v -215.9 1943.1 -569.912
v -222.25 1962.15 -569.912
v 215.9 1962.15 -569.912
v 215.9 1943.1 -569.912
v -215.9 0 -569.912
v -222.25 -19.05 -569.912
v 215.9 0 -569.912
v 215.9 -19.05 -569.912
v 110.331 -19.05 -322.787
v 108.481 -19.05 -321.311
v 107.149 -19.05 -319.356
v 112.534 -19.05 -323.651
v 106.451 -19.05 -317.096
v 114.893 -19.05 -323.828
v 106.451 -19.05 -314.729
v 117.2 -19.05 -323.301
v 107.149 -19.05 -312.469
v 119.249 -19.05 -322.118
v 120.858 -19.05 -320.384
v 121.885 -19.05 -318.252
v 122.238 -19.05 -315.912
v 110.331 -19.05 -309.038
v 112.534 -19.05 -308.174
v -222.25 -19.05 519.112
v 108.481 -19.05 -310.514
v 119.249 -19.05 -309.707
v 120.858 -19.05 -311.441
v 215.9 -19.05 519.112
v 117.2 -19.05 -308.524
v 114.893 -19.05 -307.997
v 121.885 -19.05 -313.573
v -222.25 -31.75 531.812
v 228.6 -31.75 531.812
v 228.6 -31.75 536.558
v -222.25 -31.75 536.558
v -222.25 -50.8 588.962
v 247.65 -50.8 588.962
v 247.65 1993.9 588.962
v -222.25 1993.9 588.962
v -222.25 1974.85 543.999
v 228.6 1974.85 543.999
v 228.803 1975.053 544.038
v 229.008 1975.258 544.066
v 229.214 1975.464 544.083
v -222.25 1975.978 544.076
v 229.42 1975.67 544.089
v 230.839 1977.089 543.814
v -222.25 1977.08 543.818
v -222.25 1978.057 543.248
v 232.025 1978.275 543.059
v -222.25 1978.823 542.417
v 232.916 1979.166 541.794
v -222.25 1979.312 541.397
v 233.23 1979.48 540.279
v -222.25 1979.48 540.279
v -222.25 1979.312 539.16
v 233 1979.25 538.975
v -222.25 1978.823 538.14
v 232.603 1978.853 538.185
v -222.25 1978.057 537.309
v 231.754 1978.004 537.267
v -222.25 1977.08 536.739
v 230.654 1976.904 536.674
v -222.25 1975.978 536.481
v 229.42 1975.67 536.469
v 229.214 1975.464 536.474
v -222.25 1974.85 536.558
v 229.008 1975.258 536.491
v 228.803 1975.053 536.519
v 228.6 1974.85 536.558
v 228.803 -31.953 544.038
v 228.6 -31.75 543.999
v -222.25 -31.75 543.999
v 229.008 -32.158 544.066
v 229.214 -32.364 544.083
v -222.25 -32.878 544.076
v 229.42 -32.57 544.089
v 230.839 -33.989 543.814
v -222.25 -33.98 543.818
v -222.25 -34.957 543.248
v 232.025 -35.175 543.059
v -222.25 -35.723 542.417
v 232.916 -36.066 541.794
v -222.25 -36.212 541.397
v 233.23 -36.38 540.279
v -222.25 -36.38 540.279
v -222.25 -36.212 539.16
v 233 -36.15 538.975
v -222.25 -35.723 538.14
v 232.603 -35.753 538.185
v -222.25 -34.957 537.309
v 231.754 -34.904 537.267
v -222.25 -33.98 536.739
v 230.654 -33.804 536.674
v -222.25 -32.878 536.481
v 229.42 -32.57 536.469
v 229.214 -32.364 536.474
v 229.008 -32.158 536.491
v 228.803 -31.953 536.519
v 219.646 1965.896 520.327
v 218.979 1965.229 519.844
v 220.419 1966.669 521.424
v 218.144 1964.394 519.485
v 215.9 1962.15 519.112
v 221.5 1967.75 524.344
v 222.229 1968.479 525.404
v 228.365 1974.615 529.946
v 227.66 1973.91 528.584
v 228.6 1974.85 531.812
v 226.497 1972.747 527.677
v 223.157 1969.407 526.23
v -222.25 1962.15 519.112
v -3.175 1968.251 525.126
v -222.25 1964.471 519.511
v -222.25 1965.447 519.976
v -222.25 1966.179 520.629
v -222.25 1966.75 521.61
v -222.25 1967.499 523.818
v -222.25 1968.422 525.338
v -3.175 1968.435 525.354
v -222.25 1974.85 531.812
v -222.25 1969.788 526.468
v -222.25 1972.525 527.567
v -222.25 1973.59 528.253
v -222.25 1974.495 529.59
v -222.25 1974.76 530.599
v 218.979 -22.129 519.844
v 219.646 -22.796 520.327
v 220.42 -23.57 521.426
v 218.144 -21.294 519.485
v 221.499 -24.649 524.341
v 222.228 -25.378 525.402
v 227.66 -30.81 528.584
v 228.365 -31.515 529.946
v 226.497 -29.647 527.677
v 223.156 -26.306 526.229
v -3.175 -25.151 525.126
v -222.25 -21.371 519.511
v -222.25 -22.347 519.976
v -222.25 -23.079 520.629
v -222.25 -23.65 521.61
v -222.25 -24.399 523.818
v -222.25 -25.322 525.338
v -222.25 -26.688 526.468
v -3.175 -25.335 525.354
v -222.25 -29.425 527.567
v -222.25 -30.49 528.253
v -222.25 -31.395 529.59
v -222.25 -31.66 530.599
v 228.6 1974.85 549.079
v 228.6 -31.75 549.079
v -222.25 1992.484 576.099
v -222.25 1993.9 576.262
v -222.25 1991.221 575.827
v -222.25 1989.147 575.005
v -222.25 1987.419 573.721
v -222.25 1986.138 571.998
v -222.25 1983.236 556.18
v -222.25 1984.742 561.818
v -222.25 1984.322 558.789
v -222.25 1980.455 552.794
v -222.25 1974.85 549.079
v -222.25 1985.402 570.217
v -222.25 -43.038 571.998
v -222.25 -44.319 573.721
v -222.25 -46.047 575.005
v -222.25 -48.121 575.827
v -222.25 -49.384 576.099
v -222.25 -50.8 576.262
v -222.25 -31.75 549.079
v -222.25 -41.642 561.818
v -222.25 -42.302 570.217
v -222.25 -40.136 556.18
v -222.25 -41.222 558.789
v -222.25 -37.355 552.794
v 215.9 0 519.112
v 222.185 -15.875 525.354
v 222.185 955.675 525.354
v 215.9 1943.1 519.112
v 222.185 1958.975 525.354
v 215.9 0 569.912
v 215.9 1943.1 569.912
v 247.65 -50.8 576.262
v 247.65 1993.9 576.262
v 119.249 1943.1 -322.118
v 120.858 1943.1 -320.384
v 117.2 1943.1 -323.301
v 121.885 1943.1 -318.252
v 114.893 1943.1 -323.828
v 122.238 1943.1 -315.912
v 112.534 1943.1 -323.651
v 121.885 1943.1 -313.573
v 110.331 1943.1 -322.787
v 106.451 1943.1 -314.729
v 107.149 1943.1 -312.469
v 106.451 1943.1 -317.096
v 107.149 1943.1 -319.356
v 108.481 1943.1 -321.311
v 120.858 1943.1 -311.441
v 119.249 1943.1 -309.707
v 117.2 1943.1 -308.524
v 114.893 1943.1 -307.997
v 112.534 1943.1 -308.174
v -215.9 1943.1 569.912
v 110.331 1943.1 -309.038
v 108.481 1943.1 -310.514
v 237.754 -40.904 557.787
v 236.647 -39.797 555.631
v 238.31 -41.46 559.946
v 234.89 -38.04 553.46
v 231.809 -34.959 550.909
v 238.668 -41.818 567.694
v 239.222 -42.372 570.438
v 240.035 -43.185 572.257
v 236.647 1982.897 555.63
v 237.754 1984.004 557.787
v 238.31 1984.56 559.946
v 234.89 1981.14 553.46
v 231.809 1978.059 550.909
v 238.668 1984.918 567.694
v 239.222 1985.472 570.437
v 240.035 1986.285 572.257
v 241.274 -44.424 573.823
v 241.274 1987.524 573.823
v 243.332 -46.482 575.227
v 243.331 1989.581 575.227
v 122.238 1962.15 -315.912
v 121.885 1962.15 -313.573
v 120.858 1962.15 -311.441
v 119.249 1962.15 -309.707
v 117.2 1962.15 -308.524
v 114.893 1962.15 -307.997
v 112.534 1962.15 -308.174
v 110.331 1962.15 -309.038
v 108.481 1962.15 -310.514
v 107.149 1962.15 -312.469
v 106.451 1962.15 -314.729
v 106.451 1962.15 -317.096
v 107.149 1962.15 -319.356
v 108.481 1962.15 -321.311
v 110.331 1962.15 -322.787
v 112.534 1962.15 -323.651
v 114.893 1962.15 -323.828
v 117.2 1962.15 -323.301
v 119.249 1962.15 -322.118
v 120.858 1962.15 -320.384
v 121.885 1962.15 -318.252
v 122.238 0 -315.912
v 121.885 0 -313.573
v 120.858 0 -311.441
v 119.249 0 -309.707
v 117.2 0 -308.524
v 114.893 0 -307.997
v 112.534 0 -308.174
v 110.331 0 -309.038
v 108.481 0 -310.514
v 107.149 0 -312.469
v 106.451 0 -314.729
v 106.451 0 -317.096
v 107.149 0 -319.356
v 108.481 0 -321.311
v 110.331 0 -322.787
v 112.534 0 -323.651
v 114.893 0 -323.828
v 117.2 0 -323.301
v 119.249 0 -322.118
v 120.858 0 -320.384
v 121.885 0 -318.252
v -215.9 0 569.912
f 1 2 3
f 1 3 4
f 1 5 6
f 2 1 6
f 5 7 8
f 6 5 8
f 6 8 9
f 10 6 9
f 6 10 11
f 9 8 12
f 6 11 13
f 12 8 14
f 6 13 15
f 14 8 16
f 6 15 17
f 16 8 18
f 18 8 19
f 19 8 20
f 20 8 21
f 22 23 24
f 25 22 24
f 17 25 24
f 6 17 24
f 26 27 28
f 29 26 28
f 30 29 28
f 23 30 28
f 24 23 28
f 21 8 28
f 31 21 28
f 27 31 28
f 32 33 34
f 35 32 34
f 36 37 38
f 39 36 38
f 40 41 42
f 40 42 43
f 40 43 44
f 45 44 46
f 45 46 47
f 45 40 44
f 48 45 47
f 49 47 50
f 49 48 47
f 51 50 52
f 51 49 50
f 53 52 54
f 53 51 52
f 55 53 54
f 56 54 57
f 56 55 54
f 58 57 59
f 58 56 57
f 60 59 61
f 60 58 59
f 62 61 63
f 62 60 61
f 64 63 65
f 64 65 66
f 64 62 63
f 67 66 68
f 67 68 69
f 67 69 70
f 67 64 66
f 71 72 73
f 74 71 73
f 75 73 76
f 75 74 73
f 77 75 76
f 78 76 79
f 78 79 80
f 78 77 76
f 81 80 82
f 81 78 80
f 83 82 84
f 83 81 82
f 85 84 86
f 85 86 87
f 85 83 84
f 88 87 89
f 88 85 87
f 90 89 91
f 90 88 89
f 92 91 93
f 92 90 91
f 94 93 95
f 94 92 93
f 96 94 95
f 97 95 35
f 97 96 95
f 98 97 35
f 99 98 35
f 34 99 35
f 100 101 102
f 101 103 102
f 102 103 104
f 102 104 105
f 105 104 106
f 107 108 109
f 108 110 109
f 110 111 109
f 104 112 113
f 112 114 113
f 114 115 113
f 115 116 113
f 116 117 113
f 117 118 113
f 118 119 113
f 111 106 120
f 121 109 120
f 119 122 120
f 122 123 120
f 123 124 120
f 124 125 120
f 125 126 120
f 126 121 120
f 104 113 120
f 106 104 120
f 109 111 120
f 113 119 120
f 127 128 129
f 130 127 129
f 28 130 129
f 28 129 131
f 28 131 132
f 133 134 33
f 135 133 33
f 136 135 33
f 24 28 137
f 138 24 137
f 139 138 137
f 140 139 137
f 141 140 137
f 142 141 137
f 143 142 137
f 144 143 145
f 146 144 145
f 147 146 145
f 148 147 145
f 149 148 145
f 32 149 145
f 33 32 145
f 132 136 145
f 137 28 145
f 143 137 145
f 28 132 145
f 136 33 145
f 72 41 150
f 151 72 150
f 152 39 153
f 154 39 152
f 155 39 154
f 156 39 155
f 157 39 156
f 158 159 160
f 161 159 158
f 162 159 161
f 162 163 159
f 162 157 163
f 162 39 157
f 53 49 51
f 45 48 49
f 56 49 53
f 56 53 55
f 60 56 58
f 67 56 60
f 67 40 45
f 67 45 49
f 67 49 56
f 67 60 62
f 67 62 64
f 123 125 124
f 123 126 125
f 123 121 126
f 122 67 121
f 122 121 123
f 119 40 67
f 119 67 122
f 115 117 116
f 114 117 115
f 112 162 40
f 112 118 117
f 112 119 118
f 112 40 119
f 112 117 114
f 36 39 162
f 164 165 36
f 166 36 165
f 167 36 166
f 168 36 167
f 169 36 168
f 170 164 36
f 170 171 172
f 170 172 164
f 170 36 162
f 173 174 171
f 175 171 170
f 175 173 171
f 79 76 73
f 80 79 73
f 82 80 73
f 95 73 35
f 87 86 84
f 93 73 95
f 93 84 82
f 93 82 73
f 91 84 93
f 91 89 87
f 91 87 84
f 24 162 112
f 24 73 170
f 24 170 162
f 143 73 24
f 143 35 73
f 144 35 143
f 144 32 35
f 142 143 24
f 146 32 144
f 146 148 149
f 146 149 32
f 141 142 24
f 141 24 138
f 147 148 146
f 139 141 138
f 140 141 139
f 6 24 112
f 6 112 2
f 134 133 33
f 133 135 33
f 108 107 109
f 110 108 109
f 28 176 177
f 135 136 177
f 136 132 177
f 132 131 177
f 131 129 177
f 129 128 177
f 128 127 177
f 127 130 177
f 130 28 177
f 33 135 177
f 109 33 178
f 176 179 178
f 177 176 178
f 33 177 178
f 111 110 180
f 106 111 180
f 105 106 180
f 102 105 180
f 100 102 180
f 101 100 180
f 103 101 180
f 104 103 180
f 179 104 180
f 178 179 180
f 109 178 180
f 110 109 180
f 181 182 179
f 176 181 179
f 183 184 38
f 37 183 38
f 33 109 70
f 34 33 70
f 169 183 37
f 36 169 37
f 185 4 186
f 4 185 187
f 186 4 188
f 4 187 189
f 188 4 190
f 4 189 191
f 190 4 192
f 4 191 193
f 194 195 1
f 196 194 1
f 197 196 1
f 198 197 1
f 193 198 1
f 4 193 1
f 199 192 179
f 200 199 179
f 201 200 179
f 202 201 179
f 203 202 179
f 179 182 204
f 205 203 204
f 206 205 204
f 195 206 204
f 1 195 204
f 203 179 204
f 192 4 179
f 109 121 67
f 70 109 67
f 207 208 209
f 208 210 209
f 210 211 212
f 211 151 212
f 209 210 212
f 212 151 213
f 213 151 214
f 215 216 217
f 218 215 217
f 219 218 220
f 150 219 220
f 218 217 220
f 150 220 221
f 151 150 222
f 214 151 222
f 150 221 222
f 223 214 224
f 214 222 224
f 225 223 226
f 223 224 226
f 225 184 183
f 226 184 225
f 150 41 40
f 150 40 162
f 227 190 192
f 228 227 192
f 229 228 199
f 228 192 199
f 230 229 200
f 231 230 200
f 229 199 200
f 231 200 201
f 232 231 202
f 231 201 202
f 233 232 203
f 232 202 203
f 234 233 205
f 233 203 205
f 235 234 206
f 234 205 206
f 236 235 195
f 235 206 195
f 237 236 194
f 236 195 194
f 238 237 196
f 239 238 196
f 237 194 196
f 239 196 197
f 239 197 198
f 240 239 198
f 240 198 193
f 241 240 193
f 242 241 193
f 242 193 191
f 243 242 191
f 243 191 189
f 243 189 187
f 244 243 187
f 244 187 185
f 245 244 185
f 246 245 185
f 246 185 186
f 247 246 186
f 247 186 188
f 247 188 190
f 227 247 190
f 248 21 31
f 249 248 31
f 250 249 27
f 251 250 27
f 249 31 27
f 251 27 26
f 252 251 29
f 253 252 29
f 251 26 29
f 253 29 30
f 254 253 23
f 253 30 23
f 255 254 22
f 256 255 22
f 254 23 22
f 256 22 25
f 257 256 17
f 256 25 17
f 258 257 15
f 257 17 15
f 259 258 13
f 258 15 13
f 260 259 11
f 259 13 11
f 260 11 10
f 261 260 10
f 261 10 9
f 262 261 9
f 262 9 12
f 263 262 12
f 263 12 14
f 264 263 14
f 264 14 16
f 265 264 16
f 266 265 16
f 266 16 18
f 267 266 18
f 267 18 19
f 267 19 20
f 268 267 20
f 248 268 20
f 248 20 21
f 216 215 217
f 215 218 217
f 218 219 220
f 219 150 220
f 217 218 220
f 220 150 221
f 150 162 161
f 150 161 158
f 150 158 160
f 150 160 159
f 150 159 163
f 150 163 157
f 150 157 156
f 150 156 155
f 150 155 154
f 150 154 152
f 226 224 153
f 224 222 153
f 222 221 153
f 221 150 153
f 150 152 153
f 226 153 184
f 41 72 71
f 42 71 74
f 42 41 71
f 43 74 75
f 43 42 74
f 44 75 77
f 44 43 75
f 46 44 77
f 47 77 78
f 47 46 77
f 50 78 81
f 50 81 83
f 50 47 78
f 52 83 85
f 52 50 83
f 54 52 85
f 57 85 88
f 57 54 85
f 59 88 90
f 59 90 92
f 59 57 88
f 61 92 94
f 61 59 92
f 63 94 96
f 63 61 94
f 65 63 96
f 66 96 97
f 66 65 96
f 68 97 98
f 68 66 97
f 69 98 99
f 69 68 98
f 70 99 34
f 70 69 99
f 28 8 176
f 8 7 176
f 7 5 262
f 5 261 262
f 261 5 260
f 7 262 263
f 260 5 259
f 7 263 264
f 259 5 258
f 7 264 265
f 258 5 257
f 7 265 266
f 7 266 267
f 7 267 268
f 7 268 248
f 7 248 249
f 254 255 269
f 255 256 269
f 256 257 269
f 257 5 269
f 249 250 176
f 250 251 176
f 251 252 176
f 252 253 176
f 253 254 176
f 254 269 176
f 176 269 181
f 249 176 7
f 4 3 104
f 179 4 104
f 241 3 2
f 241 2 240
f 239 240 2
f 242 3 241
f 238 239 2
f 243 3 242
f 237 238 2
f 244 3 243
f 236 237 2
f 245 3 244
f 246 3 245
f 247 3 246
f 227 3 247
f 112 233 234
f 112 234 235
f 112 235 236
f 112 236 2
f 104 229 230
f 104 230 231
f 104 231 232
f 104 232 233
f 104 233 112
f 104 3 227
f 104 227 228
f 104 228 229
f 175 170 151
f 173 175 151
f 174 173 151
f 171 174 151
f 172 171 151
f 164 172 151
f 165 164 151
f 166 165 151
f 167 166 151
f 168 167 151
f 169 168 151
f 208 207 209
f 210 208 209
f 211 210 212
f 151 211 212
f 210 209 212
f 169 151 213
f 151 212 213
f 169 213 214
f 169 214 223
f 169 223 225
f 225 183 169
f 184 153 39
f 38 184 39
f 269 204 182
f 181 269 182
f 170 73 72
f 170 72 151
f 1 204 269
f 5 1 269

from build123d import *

# Parameters (mm, degrees)
F0_W     = 431.8
F0_H     = 1139.825
F1_DEPTH = 19.05
F2_W     = 431.8
F2_H     = 1981.2
F3_DEPTH = 19.05
F4_W     = 431.8
F4_H     = 1158.875
F5_DEPTH = 19.05
F6_W     = 1981.2
F6_H     = 1158.875
F7_DEPTH = 6.35
F8_R     = 7.9375
F9_DEPTH = 1981.201


with BuildPart() as f1:
    # F0 (on Front) → F1 (new body)
    with BuildSketch(Plane.XZ):
        Rectangle(F0_W, F0_H)
    extrude(amount=F1_DEPTH)

    # F2 (on face) → F3 (join)
    with BuildSketch(Plane.XY.offset(569.9125)):
        with Locations((0, 971.55)):
            Rectangle(F2_W, F2_H)
    extrude(amount=F3_DEPTH)

    # F4 (on face) → F5 (join)
    with BuildSketch(Plane(origin=(0, 1962.15, 0), x_dir=(-1, 0, 0), z_dir=(0, 1, 0))):
        with Locations((0, 9.525)):
            Rectangle(F4_W, F4_H)
    extrude(amount=-F5_DEPTH)

    # F6 (on face) → F7 (join)
    with BuildSketch(Plane(origin=(-215.9, 0, 0), x_dir=(0, -1, 0), z_dir=(-1, 0, 0))):
        with Locations((-971.55, 9.525)):
            Rectangle(F6_W, F6_H)
    extrude(amount=F7_DEPTH)

    # F8 (on face) → F9 (cut, through all)
    with BuildSketch(Plane.XZ.offset(19.05)):
        with Locations((114.3, -315.9125)):
            Circle(F8_R)
    extrude(amount=-F9_DEPTH, mode=Mode.SUBTRACT)

    # F11: sweep along a path in F11_path
    with BuildLine(Plane(origin=(-222.25, -19.05, 588.9625), x_dir=(0, -1, 0), z_dir=(0, 0, -1))) as f11_path:
        Line((0, 0), (0, -438.15))
        Line((0, -438.15), (-1981.2, -438.15))
        Line((-1981.2, -438.15), (-1981.2, 0))
    # F10 (on face) → F11 (sweep)
    with BuildSketch(Plane(origin=(-222.25, 0, 0), x_dir=(0, -1, 0), z_dir=(-1, 0, 0))):
        with BuildLine():
            Line((50.8, 588.9625), (19.05, 588.9625))
            Line((19.05, 588.9625), (19.05, 519.1125))
            add(Edge.make_bspline(
                [(31.75, 531.8125), (31.7416161237, 527.5516487415), (26.7774713092, 527.5153415694), (23.6118440023, 523.3482432431), (23.5768222515, 519.3589263007), (19.05, 519.1125)],
                knots=[0, 0, 0, 0, 0.3590021576, 0.6464061804, 1, 1, 1, 1], degree=3))
            Line((31.75, 531.8125), (31.75, 536.5578590012))
            ThreePointArc((31.75, 536.5578590012), (36.3801046171, 540.2785482407), (31.75, 543.9992374802))
            Line((31.75, 543.9992374802), (31.75, 549.0792374802))
            add(Edge.make_bspline(
                [(50.8, 576.2625), (44.45, 575.8121847948), (40.607321351, 568.7589123857), (42.9363183206, 557.3191982676), (36.2215965457, 551.217864811), (31.75, 549.0792374802)],
                knots=[0, 0, 0, 0, 0.3355358805, 0.6499518775, 1, 1, 1, 1], degree=3))
            Line((50.8, 576.2625), (50.8, 588.9625))
        make_face()
    sweep(path=f11_path.line, transition=Transition.RIGHT)


solid = f1.part
